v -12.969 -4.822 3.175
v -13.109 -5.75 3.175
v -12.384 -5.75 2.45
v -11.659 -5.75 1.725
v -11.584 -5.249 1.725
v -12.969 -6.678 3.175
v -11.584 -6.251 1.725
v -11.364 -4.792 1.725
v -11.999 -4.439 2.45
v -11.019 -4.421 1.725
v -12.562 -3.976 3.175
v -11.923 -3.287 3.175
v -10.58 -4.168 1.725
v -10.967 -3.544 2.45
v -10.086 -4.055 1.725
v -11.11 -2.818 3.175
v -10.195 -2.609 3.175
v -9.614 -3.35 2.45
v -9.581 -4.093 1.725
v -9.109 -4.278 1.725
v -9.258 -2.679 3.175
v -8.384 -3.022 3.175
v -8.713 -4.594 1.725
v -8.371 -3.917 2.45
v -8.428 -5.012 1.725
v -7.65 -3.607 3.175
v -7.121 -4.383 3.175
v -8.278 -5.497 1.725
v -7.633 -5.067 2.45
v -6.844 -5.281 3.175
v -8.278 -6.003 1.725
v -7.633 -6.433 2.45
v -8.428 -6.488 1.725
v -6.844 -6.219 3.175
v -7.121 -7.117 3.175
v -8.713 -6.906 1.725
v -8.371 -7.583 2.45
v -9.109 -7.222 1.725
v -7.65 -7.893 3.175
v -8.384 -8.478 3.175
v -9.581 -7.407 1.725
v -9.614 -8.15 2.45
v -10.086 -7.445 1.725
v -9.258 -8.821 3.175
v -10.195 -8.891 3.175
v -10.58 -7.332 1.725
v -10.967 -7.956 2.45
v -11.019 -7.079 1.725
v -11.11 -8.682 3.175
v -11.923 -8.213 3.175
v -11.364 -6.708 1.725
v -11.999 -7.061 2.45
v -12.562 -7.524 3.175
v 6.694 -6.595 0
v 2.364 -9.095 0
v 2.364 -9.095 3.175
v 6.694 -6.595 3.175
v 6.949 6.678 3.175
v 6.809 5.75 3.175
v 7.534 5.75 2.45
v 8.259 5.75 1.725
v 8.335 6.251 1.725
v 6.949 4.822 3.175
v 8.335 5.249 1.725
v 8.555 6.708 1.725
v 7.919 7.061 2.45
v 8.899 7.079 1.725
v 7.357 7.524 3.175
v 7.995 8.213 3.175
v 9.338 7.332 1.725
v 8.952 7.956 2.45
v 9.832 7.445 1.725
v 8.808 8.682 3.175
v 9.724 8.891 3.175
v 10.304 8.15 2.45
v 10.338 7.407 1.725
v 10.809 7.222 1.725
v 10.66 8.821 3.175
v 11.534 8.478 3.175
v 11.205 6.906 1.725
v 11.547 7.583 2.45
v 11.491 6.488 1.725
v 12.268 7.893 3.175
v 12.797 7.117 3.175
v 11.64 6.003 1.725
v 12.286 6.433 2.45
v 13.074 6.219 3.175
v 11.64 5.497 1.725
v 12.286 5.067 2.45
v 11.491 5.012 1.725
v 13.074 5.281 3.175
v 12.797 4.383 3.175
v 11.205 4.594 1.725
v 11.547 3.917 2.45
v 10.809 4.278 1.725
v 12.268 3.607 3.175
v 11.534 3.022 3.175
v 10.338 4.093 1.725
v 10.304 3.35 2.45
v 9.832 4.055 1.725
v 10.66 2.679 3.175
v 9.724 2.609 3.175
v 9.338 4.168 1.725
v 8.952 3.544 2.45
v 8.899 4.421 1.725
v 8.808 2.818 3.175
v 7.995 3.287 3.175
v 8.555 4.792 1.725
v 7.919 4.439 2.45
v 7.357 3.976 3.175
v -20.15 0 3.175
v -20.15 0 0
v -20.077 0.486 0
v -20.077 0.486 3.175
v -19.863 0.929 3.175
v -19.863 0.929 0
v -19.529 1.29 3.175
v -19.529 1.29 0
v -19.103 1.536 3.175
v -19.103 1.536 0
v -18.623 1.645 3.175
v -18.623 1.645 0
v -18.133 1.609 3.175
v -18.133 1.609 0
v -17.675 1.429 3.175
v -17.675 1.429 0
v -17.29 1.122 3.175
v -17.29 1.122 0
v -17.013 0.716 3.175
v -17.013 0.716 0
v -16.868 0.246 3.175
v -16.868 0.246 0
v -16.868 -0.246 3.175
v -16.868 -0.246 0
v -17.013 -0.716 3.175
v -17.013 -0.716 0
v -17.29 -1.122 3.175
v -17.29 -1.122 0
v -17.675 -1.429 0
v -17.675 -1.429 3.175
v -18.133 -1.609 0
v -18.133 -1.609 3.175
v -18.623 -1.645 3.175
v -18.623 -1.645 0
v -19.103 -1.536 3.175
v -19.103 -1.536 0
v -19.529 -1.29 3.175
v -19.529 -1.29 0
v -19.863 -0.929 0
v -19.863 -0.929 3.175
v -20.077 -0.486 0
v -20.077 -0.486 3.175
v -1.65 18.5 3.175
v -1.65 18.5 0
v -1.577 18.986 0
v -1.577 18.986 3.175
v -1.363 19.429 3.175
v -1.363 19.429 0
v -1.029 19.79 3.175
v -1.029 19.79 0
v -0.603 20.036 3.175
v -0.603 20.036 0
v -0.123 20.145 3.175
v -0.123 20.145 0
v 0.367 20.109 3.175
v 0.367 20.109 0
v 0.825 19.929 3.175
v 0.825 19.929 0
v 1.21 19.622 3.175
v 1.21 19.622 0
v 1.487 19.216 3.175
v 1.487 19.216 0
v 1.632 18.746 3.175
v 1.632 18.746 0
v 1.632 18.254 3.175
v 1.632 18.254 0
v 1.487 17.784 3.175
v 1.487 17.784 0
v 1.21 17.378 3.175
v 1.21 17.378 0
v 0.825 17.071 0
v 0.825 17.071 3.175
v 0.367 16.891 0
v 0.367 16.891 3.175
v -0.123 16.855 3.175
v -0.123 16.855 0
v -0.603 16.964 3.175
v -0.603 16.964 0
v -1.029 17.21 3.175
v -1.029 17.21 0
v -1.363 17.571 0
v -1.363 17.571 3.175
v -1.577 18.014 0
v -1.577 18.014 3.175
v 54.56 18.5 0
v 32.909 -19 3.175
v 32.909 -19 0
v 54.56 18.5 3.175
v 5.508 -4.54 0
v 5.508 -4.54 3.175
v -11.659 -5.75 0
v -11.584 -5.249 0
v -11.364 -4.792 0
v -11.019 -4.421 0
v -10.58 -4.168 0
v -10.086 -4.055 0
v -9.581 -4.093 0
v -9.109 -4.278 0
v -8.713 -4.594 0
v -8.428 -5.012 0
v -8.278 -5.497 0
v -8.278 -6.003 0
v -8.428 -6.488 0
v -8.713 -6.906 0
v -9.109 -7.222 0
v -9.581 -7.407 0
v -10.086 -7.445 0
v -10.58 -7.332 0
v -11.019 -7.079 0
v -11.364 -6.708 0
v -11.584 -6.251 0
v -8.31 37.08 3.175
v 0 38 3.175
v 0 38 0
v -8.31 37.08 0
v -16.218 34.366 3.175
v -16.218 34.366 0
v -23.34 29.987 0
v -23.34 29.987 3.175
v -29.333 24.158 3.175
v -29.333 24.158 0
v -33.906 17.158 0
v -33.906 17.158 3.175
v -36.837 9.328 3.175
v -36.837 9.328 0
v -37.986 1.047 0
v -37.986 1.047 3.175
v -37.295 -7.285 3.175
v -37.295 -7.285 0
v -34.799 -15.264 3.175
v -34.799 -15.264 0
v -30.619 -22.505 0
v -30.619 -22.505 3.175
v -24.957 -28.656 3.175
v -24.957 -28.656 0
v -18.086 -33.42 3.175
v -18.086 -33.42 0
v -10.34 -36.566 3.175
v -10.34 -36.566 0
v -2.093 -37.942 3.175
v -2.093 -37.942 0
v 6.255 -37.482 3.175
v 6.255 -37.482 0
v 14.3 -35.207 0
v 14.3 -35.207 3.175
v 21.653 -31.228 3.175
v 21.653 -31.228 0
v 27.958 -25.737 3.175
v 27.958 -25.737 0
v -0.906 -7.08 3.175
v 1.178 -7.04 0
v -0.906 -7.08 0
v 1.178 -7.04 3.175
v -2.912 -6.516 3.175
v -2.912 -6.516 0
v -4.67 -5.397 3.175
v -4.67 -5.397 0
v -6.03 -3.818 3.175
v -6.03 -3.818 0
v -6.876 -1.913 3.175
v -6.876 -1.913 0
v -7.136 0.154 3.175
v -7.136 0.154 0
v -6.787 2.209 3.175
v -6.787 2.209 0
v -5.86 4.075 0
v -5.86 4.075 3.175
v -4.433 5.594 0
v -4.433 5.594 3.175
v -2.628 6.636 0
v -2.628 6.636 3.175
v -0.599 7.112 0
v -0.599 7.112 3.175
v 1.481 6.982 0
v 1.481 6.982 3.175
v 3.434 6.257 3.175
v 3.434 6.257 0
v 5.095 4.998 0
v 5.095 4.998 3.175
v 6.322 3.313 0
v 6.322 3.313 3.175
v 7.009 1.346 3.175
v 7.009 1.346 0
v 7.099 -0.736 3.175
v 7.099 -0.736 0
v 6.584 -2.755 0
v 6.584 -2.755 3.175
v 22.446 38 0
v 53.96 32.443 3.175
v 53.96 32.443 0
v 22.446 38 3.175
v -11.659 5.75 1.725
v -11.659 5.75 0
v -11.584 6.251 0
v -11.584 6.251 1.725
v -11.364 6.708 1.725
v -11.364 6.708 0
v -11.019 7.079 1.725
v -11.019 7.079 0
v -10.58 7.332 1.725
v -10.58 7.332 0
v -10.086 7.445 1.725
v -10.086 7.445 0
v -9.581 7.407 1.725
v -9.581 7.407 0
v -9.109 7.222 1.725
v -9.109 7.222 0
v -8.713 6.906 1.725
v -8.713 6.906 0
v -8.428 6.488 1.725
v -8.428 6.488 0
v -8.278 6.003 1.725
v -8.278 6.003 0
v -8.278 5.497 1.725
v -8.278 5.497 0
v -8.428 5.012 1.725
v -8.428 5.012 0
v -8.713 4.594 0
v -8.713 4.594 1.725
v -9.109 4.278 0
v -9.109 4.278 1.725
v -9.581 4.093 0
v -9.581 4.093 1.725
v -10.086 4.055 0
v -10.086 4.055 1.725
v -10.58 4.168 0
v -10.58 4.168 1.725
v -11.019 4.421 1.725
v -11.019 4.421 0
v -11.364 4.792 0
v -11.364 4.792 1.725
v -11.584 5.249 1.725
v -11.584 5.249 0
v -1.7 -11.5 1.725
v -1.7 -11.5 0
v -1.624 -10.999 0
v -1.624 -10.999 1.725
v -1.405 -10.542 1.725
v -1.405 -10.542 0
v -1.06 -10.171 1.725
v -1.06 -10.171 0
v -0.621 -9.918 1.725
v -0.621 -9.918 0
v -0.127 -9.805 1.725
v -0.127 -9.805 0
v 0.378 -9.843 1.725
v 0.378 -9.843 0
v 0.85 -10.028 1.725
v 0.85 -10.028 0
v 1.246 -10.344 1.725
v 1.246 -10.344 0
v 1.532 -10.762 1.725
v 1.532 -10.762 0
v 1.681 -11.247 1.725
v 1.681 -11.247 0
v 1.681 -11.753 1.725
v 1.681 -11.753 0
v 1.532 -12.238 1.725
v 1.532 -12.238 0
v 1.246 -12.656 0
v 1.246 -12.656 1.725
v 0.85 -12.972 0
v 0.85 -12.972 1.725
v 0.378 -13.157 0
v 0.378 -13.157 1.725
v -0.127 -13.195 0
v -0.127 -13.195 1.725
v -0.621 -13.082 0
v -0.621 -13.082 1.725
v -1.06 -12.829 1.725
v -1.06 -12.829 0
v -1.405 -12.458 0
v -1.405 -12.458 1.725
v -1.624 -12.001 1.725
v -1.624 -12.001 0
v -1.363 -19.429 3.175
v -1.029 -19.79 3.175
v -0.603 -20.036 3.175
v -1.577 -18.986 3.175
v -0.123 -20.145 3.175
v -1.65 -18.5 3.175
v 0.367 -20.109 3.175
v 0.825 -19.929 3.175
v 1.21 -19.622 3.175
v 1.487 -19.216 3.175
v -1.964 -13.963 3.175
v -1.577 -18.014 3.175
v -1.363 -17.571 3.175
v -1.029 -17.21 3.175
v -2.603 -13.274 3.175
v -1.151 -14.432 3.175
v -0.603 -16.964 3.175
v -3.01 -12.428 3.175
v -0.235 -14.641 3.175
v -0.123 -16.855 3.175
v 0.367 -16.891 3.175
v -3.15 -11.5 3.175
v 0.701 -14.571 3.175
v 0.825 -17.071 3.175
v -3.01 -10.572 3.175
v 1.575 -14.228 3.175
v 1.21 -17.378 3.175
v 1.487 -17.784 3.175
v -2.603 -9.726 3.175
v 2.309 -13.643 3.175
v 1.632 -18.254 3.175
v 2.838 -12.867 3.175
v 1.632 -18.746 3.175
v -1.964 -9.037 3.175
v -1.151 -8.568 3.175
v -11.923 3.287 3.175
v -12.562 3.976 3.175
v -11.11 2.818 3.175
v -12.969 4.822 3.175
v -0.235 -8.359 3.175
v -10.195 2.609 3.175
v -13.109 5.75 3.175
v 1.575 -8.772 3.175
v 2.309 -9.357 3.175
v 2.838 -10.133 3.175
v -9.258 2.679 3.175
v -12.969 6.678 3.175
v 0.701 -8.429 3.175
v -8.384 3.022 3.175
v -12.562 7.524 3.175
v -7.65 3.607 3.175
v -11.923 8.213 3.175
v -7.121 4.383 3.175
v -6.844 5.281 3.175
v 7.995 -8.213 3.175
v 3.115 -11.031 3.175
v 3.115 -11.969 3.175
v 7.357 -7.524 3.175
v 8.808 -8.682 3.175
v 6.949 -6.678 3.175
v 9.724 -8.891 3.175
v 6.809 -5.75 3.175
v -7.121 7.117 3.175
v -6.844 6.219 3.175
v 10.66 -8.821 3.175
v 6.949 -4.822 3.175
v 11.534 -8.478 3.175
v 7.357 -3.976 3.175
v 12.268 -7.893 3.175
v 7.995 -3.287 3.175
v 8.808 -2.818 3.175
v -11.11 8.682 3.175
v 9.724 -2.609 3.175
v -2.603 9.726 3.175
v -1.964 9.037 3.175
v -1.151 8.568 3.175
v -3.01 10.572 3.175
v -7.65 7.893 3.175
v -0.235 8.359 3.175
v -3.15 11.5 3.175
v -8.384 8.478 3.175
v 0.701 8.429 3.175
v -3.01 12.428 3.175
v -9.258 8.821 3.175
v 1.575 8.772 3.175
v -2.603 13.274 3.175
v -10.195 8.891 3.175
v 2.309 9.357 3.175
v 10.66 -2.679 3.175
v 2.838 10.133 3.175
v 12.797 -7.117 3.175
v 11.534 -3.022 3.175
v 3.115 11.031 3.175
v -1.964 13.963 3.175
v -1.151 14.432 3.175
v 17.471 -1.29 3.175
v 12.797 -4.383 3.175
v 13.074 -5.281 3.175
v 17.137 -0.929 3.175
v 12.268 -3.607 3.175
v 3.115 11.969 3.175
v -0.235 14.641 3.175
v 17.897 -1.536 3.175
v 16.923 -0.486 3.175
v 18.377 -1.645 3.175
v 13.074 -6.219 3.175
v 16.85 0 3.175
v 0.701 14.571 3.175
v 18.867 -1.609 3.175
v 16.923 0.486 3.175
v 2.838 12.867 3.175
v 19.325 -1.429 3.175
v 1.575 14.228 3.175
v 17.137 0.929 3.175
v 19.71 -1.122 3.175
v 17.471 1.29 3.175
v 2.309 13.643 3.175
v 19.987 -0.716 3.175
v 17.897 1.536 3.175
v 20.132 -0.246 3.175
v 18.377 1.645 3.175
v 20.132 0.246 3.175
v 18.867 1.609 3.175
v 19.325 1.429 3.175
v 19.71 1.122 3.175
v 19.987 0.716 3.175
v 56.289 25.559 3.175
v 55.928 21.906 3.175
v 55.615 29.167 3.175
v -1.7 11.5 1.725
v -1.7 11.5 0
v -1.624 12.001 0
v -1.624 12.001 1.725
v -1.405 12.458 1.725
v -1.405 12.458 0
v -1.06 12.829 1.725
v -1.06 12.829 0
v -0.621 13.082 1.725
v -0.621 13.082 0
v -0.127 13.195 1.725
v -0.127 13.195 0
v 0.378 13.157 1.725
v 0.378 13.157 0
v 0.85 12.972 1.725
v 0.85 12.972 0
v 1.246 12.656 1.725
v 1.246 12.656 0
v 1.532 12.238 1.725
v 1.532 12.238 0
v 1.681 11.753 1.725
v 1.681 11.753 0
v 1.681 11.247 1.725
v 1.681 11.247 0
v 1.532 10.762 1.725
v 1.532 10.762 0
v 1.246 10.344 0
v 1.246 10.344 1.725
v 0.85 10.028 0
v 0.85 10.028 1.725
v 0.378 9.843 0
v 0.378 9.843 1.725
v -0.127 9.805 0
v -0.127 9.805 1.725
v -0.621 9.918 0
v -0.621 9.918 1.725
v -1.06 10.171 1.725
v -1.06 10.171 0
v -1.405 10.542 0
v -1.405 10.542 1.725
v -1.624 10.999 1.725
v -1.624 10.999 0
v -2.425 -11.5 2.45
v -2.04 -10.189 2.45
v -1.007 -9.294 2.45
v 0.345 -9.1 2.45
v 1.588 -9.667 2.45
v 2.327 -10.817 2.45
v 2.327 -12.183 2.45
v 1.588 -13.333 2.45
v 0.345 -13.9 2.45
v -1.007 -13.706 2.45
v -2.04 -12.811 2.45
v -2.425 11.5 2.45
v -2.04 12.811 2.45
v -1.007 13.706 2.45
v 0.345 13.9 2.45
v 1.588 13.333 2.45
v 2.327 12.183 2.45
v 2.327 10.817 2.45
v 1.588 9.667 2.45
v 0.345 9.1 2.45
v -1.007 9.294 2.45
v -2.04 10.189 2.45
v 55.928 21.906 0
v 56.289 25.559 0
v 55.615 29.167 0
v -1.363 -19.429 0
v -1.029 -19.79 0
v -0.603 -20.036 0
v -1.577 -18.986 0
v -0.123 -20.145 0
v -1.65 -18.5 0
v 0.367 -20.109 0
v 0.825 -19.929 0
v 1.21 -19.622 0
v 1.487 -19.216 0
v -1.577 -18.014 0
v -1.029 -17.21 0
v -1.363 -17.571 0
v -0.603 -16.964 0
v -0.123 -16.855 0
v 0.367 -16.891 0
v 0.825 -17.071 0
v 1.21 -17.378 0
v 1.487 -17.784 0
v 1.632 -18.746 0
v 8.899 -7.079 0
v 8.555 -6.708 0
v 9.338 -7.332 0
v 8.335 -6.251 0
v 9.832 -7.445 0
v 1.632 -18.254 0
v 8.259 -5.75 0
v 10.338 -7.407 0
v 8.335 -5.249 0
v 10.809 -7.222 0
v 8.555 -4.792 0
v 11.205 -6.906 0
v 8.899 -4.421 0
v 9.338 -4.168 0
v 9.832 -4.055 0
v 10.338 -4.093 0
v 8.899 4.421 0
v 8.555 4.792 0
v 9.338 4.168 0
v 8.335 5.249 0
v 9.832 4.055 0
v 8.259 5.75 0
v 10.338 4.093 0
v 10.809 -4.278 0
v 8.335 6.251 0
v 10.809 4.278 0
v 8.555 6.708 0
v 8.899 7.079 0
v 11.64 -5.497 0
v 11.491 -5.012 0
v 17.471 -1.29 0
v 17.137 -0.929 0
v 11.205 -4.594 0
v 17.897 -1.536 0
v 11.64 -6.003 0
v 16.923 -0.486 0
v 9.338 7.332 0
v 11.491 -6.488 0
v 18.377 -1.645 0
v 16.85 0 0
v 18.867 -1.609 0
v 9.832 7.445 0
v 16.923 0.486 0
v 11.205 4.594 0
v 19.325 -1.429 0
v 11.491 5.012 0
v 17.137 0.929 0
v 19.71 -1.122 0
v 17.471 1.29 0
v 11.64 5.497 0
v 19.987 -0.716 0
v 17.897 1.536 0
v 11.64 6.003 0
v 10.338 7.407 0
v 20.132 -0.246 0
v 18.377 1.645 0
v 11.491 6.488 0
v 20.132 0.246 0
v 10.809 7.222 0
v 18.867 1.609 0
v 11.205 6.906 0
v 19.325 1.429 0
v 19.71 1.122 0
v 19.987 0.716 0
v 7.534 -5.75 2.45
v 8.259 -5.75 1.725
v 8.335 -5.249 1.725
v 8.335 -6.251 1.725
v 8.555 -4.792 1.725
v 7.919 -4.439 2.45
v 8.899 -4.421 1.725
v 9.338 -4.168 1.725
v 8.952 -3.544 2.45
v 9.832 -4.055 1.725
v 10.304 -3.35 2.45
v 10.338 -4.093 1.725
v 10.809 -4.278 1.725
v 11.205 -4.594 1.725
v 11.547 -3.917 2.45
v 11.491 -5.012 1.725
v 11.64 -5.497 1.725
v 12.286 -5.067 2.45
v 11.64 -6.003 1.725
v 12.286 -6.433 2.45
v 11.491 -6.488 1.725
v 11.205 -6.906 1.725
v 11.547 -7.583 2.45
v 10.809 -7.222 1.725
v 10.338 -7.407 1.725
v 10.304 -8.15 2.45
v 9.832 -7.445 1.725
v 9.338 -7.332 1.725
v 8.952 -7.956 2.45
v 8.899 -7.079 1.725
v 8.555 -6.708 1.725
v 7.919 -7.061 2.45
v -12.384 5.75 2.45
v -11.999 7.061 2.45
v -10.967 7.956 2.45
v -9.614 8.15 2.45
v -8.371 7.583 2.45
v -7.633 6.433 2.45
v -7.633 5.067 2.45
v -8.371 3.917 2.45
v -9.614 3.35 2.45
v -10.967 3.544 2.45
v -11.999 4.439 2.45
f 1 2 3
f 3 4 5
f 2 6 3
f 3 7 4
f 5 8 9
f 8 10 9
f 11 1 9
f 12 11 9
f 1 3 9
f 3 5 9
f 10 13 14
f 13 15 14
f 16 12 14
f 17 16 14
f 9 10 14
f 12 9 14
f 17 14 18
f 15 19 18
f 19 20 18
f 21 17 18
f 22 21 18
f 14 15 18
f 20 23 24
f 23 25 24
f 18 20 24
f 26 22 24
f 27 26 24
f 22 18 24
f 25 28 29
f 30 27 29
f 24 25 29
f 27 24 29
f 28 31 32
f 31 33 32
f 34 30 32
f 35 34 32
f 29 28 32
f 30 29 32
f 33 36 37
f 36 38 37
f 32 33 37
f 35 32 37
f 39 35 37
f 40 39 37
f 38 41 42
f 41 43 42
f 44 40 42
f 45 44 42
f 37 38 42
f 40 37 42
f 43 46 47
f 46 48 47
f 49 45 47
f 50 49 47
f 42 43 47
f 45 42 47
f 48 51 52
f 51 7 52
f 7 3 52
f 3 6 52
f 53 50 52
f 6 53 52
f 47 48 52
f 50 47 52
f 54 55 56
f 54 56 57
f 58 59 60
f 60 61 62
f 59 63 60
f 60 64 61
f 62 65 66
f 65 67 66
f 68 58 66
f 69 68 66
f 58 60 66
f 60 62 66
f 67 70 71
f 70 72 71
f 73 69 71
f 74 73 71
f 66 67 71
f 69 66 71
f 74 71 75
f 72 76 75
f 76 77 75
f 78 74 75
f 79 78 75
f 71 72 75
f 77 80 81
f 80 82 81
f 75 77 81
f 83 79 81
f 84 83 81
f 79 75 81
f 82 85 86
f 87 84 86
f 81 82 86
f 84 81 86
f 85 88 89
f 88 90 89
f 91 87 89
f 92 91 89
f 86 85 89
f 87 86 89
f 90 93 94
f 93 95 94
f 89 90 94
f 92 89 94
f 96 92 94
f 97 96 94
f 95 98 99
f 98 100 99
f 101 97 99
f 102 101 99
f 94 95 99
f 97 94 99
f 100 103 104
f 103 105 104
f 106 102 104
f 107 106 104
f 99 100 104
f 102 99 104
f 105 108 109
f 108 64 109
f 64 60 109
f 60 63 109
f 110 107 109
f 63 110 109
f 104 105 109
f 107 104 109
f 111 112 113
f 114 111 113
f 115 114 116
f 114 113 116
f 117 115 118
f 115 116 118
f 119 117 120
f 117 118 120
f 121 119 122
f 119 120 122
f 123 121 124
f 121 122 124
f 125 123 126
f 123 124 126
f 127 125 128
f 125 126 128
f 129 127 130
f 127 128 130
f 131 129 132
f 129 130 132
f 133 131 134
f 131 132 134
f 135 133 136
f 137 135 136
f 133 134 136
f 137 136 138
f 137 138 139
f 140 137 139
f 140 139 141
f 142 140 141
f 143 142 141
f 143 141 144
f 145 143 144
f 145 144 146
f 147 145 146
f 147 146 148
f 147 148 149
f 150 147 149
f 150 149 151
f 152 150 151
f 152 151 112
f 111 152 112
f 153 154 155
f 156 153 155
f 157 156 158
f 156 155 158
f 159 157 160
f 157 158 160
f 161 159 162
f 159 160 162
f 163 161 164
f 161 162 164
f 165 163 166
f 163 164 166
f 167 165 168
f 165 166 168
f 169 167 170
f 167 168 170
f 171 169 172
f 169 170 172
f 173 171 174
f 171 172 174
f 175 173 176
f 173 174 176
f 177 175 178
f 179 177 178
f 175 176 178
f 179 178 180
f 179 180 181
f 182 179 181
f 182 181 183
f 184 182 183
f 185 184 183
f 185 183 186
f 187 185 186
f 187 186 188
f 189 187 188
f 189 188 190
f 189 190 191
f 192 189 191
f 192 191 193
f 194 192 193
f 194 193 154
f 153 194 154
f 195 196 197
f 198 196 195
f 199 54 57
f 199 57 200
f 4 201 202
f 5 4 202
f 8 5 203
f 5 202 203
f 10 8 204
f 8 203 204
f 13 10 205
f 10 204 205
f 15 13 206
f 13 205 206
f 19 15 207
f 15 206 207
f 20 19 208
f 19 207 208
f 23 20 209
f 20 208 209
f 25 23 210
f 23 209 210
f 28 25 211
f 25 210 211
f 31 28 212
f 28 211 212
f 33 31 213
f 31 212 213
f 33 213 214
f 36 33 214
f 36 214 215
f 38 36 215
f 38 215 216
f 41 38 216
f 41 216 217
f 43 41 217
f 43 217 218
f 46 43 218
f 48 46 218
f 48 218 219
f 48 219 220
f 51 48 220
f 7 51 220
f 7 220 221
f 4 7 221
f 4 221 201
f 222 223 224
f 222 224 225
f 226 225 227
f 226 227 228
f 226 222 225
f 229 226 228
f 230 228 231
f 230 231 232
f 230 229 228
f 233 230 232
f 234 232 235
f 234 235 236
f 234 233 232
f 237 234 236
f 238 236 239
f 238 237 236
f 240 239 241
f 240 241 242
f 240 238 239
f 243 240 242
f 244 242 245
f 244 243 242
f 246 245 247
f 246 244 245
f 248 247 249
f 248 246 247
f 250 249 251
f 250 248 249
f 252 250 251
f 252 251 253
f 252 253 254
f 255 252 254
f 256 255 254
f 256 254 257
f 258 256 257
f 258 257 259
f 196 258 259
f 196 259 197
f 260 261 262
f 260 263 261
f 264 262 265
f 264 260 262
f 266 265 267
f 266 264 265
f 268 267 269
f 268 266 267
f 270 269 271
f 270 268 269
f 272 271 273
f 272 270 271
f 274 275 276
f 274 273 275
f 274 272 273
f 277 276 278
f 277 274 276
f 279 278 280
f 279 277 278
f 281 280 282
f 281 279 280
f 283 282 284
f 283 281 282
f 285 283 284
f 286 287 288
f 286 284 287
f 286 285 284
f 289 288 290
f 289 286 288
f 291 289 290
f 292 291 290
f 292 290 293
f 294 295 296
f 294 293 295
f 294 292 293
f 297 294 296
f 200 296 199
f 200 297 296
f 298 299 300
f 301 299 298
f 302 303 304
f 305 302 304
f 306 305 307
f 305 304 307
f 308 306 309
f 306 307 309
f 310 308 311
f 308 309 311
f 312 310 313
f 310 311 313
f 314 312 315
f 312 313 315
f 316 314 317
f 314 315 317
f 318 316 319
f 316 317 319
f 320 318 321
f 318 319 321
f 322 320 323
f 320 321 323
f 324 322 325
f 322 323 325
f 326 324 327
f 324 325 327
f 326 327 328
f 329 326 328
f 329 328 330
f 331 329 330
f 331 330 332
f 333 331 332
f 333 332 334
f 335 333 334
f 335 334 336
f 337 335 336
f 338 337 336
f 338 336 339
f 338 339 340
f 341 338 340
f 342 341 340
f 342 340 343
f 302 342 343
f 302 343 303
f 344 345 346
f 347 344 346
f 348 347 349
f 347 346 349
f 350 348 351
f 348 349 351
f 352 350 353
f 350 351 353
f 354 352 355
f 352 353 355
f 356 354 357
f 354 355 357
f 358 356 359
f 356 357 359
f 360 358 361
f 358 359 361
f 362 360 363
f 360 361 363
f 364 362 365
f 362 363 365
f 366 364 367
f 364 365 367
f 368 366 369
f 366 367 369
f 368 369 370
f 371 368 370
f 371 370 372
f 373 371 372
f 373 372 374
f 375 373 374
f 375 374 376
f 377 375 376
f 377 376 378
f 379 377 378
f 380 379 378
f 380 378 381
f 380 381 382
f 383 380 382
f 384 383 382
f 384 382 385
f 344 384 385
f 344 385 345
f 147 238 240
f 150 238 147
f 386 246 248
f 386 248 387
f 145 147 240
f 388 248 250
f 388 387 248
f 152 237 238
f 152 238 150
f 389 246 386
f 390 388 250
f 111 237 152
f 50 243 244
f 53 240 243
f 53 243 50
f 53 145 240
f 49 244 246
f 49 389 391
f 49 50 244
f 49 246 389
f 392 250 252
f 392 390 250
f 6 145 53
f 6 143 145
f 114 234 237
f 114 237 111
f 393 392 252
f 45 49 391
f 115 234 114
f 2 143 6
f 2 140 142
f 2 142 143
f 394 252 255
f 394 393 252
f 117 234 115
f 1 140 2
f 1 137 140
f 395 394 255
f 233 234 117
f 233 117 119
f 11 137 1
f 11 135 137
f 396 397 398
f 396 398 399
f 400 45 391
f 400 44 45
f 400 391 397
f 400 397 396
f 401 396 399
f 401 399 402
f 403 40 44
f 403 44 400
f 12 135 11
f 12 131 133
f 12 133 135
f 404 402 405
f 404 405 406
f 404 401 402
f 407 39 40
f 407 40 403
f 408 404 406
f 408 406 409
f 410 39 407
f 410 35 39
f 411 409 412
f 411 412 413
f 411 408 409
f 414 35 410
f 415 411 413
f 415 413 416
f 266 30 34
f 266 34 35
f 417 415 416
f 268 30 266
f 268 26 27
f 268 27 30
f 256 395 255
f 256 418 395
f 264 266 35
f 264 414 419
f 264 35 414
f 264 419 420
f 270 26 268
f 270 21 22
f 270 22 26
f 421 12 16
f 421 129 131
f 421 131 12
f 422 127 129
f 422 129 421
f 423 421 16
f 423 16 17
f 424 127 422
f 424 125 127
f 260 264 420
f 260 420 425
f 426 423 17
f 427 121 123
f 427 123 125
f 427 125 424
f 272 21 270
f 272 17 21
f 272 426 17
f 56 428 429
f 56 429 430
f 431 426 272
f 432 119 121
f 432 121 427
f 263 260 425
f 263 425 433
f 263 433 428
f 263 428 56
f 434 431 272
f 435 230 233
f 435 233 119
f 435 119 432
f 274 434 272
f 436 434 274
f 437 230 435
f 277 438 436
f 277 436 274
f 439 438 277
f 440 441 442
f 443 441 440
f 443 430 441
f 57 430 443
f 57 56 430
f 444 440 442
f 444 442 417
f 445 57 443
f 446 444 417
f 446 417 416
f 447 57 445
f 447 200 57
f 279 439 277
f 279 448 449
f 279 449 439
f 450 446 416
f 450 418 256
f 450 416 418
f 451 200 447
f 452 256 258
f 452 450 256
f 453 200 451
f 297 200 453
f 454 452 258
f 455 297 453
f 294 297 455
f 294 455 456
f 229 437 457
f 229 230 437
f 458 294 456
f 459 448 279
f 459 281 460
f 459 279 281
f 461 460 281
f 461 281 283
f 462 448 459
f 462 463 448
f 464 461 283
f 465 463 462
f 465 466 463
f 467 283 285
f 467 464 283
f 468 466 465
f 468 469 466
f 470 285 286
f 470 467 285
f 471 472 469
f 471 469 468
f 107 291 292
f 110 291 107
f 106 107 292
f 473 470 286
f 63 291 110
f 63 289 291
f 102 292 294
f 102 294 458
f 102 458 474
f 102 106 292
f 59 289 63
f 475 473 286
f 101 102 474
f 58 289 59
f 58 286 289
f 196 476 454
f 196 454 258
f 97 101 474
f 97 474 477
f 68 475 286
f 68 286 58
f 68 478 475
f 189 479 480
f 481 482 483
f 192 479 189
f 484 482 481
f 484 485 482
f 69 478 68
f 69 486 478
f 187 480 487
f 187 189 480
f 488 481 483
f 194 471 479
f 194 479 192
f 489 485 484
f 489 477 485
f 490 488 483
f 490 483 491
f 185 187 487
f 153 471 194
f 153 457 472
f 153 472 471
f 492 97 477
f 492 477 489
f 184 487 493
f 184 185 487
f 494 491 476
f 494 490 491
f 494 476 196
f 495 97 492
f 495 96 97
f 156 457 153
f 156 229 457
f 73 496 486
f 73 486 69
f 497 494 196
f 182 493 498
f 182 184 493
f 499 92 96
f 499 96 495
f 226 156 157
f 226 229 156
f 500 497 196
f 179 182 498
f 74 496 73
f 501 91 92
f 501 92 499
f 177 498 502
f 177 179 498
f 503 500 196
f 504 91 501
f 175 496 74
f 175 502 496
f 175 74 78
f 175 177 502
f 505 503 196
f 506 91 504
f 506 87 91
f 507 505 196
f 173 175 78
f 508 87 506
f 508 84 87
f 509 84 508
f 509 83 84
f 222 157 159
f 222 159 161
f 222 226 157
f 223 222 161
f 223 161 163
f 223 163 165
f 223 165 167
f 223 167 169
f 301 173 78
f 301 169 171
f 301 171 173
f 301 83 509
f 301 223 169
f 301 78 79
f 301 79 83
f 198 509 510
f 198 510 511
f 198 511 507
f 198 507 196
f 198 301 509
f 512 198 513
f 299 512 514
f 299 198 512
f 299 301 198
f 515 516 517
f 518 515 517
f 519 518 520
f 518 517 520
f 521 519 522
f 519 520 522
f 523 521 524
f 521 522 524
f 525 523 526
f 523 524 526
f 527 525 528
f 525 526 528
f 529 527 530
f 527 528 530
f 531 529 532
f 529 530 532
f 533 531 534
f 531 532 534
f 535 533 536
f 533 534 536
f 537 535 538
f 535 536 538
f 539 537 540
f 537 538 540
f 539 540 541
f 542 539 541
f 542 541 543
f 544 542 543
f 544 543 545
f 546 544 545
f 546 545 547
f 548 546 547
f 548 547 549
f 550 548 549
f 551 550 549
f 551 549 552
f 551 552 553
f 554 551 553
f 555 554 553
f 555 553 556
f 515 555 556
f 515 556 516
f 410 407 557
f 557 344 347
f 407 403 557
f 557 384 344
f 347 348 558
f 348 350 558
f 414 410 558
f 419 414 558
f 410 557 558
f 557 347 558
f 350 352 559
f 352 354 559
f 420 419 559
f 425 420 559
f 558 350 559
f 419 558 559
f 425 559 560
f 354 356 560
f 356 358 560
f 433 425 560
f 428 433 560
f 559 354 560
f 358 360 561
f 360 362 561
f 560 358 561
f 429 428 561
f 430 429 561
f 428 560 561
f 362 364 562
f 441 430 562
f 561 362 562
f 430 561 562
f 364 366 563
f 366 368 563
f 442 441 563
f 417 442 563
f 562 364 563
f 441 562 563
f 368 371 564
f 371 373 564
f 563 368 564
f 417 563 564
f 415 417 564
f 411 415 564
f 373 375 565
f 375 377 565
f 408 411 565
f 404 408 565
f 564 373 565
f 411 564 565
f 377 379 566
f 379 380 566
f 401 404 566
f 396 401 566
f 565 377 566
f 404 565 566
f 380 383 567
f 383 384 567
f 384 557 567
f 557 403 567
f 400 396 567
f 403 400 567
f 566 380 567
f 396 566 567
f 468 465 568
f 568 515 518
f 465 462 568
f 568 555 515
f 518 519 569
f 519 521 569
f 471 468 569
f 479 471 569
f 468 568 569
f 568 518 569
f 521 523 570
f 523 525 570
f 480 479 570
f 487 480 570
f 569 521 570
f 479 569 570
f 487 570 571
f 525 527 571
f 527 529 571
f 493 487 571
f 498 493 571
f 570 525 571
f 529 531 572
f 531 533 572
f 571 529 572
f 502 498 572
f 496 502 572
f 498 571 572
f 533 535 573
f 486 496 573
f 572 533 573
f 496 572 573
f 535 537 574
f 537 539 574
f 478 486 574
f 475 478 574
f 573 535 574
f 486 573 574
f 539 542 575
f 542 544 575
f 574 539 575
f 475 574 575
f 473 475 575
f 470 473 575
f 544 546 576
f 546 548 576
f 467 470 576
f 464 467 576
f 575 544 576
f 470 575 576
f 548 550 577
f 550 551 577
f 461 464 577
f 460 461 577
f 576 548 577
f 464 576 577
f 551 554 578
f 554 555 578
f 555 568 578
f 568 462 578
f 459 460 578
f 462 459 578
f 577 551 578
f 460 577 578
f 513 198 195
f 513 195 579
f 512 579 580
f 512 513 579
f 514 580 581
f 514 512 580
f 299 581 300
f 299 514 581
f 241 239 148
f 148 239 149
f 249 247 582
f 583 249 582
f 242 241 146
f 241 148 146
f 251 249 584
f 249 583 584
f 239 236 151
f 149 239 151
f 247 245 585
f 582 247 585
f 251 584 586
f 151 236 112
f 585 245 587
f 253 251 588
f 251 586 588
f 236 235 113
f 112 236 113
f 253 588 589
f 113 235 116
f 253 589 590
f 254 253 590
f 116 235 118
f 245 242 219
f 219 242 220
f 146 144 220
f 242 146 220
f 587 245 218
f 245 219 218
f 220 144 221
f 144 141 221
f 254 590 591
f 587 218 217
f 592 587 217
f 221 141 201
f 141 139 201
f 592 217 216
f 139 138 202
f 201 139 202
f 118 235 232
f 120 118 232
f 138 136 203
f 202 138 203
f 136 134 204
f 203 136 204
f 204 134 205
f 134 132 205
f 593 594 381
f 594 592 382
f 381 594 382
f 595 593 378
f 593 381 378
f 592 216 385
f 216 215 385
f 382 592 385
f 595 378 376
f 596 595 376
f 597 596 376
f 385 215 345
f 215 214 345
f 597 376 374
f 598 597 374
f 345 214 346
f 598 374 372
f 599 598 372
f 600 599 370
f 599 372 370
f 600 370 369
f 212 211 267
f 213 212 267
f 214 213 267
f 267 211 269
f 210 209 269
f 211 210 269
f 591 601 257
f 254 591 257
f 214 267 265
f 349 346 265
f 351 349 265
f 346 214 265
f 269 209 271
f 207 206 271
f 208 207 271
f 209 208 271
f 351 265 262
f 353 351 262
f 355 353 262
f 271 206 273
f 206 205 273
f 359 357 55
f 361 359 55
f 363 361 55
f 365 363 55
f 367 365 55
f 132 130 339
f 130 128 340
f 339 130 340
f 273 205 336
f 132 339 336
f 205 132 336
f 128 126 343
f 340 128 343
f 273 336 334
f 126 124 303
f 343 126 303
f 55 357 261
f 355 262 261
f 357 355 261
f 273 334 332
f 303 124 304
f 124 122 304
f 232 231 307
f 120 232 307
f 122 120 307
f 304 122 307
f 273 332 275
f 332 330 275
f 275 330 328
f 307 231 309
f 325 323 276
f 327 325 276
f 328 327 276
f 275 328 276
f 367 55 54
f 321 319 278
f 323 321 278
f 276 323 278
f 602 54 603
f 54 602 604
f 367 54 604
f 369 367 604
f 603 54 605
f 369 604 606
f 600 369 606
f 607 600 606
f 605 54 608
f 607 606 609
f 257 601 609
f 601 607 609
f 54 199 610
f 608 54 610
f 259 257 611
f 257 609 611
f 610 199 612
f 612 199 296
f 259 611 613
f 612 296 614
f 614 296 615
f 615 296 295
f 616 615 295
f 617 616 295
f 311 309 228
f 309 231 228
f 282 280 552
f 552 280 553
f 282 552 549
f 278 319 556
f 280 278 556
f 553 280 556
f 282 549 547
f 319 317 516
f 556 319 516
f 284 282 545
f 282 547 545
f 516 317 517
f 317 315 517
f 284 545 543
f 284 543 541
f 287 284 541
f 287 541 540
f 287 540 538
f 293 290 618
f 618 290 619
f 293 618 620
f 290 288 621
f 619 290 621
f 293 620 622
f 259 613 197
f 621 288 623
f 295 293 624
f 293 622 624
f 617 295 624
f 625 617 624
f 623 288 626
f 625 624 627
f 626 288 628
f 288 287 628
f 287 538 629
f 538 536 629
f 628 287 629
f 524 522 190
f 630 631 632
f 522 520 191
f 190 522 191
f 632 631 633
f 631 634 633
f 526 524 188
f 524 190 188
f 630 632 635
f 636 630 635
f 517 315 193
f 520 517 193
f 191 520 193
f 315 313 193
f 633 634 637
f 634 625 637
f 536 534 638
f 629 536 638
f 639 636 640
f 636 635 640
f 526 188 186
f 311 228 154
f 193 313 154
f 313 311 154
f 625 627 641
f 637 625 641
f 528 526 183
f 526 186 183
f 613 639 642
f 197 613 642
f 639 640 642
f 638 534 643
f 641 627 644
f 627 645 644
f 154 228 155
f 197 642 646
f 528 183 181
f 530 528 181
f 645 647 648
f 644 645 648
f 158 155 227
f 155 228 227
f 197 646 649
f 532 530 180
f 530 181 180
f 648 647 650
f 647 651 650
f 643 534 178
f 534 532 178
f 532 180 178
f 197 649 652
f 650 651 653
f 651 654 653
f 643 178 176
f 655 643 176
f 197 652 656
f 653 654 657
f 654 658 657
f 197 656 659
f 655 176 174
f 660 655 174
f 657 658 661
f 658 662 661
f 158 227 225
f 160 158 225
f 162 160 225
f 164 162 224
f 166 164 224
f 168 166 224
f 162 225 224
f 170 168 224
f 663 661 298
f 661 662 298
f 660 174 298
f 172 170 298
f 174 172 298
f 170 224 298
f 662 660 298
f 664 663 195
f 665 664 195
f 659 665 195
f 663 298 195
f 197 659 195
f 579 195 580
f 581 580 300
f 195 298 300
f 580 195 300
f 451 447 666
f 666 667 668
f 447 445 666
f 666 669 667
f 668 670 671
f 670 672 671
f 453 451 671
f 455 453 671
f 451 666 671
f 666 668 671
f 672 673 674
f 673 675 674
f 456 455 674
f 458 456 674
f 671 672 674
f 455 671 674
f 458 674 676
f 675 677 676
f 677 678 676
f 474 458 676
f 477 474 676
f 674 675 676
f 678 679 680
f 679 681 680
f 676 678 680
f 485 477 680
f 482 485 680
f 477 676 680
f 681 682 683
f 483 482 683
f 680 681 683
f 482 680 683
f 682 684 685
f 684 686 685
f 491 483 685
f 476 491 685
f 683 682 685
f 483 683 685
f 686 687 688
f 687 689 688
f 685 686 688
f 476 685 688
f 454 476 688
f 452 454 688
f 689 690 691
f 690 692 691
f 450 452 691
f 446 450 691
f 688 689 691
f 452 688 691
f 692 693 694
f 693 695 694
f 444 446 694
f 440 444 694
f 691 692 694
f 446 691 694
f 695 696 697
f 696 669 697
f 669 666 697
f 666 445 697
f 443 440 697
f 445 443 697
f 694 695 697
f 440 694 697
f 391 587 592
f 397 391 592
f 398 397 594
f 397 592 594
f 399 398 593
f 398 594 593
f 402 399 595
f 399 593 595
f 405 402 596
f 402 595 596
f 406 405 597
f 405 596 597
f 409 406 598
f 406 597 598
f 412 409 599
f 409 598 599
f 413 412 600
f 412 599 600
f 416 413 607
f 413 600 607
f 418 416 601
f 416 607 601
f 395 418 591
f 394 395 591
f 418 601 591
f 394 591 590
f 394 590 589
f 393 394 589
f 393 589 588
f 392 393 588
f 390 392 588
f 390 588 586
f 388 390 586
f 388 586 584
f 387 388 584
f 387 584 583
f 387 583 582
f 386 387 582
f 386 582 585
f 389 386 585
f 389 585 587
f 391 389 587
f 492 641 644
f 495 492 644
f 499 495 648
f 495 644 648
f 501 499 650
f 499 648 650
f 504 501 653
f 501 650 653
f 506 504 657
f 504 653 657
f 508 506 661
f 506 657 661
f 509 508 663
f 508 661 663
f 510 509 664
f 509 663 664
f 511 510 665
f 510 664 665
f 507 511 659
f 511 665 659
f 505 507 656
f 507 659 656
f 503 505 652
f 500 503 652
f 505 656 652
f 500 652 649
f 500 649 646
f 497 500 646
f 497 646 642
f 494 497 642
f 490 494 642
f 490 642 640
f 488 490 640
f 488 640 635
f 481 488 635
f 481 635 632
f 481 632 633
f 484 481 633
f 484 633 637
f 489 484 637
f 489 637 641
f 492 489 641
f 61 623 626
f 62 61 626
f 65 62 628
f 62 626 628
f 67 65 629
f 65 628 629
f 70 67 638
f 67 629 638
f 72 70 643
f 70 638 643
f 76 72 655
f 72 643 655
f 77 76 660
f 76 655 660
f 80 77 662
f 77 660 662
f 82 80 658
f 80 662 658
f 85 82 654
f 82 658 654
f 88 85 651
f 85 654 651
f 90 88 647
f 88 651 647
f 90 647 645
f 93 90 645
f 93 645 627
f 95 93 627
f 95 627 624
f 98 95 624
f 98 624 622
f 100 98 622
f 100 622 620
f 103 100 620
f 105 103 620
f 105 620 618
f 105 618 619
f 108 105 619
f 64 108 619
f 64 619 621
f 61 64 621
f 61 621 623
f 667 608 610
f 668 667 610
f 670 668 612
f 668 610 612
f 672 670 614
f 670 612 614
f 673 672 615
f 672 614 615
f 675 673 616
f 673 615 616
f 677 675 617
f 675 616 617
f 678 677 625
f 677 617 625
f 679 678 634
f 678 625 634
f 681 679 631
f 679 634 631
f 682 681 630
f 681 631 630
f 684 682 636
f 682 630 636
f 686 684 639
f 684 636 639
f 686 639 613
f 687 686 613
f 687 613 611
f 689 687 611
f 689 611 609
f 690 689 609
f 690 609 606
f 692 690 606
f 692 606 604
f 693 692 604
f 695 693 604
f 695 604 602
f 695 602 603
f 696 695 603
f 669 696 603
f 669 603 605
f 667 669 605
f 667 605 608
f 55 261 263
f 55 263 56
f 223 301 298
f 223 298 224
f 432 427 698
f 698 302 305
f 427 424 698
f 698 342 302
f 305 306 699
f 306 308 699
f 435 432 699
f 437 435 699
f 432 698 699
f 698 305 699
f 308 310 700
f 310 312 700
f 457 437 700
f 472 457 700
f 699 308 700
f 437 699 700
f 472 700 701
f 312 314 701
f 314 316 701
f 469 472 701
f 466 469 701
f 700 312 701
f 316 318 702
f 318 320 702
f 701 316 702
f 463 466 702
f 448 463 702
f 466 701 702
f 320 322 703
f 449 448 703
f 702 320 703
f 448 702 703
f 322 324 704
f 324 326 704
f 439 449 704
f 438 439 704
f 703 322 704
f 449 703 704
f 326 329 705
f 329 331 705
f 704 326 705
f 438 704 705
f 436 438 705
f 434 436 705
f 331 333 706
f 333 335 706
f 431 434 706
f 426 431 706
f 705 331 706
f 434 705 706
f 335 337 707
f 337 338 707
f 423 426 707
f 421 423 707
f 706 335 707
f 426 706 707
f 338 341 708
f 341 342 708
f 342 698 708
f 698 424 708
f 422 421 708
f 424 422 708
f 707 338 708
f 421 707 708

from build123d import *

# Parameters (mm, degrees)
BOSS_EXTRUDE1_DEPTH                               = 3.175
SKETCH4_W                                         = 7.1374
SKETCH4_H                                         = 3.175
F_4_CLEARANCE_HOLE1_D                             = 3.3
F_4_CLEARANCE_HOLE1_DEPTH                         = 3.175
CSK_FOR_4_FLAT_HEAD_MACHINE_SCREW_100_D           = 3.4
CSK_FOR_4_FLAT_HEAD_MACHINE_SCREW_100_DEPTH       = 3.175
CSK_FOR_4_FLAT_HEAD_MACHINE_SCREW_100_CSINK_D     = 6.3
CSK_FOR_4_FLAT_HEAD_MACHINE_SCREW_100_CSINK_ANGLE = 90
CUT_EXTRUDE1_DEPTH                                = 4.175


with BuildPart() as part:
    # Sketch1 → Boss-Extrude1 (new body)
    with BuildSketch(Plane.XY.offset(3.175)):
        with BuildLine():
            Line((53.959502015, 32.443258315), (22.445653919, 38))
            Line((22.445653919, 38), (0, 38))
            ThreePointArc((0, 38), (-32.908965344, -19), (32.908965344, -19))
            Line((32.908965344, -19), (54.559600438, 18.5))
            ThreePointArc((54.559600438, 18.5), (56.289246799, 25.558984429), (53.959502015, 32.443258315))
        make_face()
    extrude(amount=-BOSS_EXTRUDE1_DEPTH)

    # Sketch4 → Cut-Revolve1 (revolve, cut)
    with BuildSketch(Plane.XZ):
        with Locations((3.5687, 1.5875)):
            Rectangle(SKETCH4_W, SKETCH4_H)
    revolve(axis=Axis((0, 0, 3.175), (0, 0, -1)), mode=Mode.SUBTRACT)

    # #4 Clearance Hole1
    with Locations(Plane.XY.offset(3.175)):
        with Locations((18.5, 0), (0, -18.5), (-18.5, 0), (0, 18.5)):
            Hole(F_4_CLEARANCE_HOLE1_D / 2, depth=F_4_CLEARANCE_HOLE1_DEPTH)

    # CSK for #4 Flat Head Machine Screw (100)1
    with Locations(Plane.XY.offset(3.175)):
        with Locations((-9.959292144, 5.75), (-9.959292144, -5.75), (0, -11.5), (9.959292144, -5.75), (9.959292144, 5.75), (0, 11.5)):
            CounterSinkHole(CSK_FOR_4_FLAT_HEAD_MACHINE_SCREW_100_D / 2, CSK_FOR_4_FLAT_HEAD_MACHINE_SCREW_100_CSINK_D / 2, depth=CSK_FOR_4_FLAT_HEAD_MACHINE_SCREW_100_DEPTH, counter_sink_angle=CSK_FOR_4_FLAT_HEAD_MACHINE_SCREW_100_CSINK_ANGLE)

    # Sketch9 → Cut-Extrude1 (cut, through all)
    with BuildSketch(Plane(origin=(0, 0, 0), x_dir=(-1, 0, 0), z_dir=(0, 0, -1))):
        Polygon((-2.364186438, -9.09489103), (-6.694313457, -6.59489103), (-5.439804269, -4.422017377), (-1.10967725, -6.922017377), align=None)
    extrude(amount=-CUT_EXTRUDE1_DEPTH, mode=Mode.SUBTRACT)


solid = part.part
